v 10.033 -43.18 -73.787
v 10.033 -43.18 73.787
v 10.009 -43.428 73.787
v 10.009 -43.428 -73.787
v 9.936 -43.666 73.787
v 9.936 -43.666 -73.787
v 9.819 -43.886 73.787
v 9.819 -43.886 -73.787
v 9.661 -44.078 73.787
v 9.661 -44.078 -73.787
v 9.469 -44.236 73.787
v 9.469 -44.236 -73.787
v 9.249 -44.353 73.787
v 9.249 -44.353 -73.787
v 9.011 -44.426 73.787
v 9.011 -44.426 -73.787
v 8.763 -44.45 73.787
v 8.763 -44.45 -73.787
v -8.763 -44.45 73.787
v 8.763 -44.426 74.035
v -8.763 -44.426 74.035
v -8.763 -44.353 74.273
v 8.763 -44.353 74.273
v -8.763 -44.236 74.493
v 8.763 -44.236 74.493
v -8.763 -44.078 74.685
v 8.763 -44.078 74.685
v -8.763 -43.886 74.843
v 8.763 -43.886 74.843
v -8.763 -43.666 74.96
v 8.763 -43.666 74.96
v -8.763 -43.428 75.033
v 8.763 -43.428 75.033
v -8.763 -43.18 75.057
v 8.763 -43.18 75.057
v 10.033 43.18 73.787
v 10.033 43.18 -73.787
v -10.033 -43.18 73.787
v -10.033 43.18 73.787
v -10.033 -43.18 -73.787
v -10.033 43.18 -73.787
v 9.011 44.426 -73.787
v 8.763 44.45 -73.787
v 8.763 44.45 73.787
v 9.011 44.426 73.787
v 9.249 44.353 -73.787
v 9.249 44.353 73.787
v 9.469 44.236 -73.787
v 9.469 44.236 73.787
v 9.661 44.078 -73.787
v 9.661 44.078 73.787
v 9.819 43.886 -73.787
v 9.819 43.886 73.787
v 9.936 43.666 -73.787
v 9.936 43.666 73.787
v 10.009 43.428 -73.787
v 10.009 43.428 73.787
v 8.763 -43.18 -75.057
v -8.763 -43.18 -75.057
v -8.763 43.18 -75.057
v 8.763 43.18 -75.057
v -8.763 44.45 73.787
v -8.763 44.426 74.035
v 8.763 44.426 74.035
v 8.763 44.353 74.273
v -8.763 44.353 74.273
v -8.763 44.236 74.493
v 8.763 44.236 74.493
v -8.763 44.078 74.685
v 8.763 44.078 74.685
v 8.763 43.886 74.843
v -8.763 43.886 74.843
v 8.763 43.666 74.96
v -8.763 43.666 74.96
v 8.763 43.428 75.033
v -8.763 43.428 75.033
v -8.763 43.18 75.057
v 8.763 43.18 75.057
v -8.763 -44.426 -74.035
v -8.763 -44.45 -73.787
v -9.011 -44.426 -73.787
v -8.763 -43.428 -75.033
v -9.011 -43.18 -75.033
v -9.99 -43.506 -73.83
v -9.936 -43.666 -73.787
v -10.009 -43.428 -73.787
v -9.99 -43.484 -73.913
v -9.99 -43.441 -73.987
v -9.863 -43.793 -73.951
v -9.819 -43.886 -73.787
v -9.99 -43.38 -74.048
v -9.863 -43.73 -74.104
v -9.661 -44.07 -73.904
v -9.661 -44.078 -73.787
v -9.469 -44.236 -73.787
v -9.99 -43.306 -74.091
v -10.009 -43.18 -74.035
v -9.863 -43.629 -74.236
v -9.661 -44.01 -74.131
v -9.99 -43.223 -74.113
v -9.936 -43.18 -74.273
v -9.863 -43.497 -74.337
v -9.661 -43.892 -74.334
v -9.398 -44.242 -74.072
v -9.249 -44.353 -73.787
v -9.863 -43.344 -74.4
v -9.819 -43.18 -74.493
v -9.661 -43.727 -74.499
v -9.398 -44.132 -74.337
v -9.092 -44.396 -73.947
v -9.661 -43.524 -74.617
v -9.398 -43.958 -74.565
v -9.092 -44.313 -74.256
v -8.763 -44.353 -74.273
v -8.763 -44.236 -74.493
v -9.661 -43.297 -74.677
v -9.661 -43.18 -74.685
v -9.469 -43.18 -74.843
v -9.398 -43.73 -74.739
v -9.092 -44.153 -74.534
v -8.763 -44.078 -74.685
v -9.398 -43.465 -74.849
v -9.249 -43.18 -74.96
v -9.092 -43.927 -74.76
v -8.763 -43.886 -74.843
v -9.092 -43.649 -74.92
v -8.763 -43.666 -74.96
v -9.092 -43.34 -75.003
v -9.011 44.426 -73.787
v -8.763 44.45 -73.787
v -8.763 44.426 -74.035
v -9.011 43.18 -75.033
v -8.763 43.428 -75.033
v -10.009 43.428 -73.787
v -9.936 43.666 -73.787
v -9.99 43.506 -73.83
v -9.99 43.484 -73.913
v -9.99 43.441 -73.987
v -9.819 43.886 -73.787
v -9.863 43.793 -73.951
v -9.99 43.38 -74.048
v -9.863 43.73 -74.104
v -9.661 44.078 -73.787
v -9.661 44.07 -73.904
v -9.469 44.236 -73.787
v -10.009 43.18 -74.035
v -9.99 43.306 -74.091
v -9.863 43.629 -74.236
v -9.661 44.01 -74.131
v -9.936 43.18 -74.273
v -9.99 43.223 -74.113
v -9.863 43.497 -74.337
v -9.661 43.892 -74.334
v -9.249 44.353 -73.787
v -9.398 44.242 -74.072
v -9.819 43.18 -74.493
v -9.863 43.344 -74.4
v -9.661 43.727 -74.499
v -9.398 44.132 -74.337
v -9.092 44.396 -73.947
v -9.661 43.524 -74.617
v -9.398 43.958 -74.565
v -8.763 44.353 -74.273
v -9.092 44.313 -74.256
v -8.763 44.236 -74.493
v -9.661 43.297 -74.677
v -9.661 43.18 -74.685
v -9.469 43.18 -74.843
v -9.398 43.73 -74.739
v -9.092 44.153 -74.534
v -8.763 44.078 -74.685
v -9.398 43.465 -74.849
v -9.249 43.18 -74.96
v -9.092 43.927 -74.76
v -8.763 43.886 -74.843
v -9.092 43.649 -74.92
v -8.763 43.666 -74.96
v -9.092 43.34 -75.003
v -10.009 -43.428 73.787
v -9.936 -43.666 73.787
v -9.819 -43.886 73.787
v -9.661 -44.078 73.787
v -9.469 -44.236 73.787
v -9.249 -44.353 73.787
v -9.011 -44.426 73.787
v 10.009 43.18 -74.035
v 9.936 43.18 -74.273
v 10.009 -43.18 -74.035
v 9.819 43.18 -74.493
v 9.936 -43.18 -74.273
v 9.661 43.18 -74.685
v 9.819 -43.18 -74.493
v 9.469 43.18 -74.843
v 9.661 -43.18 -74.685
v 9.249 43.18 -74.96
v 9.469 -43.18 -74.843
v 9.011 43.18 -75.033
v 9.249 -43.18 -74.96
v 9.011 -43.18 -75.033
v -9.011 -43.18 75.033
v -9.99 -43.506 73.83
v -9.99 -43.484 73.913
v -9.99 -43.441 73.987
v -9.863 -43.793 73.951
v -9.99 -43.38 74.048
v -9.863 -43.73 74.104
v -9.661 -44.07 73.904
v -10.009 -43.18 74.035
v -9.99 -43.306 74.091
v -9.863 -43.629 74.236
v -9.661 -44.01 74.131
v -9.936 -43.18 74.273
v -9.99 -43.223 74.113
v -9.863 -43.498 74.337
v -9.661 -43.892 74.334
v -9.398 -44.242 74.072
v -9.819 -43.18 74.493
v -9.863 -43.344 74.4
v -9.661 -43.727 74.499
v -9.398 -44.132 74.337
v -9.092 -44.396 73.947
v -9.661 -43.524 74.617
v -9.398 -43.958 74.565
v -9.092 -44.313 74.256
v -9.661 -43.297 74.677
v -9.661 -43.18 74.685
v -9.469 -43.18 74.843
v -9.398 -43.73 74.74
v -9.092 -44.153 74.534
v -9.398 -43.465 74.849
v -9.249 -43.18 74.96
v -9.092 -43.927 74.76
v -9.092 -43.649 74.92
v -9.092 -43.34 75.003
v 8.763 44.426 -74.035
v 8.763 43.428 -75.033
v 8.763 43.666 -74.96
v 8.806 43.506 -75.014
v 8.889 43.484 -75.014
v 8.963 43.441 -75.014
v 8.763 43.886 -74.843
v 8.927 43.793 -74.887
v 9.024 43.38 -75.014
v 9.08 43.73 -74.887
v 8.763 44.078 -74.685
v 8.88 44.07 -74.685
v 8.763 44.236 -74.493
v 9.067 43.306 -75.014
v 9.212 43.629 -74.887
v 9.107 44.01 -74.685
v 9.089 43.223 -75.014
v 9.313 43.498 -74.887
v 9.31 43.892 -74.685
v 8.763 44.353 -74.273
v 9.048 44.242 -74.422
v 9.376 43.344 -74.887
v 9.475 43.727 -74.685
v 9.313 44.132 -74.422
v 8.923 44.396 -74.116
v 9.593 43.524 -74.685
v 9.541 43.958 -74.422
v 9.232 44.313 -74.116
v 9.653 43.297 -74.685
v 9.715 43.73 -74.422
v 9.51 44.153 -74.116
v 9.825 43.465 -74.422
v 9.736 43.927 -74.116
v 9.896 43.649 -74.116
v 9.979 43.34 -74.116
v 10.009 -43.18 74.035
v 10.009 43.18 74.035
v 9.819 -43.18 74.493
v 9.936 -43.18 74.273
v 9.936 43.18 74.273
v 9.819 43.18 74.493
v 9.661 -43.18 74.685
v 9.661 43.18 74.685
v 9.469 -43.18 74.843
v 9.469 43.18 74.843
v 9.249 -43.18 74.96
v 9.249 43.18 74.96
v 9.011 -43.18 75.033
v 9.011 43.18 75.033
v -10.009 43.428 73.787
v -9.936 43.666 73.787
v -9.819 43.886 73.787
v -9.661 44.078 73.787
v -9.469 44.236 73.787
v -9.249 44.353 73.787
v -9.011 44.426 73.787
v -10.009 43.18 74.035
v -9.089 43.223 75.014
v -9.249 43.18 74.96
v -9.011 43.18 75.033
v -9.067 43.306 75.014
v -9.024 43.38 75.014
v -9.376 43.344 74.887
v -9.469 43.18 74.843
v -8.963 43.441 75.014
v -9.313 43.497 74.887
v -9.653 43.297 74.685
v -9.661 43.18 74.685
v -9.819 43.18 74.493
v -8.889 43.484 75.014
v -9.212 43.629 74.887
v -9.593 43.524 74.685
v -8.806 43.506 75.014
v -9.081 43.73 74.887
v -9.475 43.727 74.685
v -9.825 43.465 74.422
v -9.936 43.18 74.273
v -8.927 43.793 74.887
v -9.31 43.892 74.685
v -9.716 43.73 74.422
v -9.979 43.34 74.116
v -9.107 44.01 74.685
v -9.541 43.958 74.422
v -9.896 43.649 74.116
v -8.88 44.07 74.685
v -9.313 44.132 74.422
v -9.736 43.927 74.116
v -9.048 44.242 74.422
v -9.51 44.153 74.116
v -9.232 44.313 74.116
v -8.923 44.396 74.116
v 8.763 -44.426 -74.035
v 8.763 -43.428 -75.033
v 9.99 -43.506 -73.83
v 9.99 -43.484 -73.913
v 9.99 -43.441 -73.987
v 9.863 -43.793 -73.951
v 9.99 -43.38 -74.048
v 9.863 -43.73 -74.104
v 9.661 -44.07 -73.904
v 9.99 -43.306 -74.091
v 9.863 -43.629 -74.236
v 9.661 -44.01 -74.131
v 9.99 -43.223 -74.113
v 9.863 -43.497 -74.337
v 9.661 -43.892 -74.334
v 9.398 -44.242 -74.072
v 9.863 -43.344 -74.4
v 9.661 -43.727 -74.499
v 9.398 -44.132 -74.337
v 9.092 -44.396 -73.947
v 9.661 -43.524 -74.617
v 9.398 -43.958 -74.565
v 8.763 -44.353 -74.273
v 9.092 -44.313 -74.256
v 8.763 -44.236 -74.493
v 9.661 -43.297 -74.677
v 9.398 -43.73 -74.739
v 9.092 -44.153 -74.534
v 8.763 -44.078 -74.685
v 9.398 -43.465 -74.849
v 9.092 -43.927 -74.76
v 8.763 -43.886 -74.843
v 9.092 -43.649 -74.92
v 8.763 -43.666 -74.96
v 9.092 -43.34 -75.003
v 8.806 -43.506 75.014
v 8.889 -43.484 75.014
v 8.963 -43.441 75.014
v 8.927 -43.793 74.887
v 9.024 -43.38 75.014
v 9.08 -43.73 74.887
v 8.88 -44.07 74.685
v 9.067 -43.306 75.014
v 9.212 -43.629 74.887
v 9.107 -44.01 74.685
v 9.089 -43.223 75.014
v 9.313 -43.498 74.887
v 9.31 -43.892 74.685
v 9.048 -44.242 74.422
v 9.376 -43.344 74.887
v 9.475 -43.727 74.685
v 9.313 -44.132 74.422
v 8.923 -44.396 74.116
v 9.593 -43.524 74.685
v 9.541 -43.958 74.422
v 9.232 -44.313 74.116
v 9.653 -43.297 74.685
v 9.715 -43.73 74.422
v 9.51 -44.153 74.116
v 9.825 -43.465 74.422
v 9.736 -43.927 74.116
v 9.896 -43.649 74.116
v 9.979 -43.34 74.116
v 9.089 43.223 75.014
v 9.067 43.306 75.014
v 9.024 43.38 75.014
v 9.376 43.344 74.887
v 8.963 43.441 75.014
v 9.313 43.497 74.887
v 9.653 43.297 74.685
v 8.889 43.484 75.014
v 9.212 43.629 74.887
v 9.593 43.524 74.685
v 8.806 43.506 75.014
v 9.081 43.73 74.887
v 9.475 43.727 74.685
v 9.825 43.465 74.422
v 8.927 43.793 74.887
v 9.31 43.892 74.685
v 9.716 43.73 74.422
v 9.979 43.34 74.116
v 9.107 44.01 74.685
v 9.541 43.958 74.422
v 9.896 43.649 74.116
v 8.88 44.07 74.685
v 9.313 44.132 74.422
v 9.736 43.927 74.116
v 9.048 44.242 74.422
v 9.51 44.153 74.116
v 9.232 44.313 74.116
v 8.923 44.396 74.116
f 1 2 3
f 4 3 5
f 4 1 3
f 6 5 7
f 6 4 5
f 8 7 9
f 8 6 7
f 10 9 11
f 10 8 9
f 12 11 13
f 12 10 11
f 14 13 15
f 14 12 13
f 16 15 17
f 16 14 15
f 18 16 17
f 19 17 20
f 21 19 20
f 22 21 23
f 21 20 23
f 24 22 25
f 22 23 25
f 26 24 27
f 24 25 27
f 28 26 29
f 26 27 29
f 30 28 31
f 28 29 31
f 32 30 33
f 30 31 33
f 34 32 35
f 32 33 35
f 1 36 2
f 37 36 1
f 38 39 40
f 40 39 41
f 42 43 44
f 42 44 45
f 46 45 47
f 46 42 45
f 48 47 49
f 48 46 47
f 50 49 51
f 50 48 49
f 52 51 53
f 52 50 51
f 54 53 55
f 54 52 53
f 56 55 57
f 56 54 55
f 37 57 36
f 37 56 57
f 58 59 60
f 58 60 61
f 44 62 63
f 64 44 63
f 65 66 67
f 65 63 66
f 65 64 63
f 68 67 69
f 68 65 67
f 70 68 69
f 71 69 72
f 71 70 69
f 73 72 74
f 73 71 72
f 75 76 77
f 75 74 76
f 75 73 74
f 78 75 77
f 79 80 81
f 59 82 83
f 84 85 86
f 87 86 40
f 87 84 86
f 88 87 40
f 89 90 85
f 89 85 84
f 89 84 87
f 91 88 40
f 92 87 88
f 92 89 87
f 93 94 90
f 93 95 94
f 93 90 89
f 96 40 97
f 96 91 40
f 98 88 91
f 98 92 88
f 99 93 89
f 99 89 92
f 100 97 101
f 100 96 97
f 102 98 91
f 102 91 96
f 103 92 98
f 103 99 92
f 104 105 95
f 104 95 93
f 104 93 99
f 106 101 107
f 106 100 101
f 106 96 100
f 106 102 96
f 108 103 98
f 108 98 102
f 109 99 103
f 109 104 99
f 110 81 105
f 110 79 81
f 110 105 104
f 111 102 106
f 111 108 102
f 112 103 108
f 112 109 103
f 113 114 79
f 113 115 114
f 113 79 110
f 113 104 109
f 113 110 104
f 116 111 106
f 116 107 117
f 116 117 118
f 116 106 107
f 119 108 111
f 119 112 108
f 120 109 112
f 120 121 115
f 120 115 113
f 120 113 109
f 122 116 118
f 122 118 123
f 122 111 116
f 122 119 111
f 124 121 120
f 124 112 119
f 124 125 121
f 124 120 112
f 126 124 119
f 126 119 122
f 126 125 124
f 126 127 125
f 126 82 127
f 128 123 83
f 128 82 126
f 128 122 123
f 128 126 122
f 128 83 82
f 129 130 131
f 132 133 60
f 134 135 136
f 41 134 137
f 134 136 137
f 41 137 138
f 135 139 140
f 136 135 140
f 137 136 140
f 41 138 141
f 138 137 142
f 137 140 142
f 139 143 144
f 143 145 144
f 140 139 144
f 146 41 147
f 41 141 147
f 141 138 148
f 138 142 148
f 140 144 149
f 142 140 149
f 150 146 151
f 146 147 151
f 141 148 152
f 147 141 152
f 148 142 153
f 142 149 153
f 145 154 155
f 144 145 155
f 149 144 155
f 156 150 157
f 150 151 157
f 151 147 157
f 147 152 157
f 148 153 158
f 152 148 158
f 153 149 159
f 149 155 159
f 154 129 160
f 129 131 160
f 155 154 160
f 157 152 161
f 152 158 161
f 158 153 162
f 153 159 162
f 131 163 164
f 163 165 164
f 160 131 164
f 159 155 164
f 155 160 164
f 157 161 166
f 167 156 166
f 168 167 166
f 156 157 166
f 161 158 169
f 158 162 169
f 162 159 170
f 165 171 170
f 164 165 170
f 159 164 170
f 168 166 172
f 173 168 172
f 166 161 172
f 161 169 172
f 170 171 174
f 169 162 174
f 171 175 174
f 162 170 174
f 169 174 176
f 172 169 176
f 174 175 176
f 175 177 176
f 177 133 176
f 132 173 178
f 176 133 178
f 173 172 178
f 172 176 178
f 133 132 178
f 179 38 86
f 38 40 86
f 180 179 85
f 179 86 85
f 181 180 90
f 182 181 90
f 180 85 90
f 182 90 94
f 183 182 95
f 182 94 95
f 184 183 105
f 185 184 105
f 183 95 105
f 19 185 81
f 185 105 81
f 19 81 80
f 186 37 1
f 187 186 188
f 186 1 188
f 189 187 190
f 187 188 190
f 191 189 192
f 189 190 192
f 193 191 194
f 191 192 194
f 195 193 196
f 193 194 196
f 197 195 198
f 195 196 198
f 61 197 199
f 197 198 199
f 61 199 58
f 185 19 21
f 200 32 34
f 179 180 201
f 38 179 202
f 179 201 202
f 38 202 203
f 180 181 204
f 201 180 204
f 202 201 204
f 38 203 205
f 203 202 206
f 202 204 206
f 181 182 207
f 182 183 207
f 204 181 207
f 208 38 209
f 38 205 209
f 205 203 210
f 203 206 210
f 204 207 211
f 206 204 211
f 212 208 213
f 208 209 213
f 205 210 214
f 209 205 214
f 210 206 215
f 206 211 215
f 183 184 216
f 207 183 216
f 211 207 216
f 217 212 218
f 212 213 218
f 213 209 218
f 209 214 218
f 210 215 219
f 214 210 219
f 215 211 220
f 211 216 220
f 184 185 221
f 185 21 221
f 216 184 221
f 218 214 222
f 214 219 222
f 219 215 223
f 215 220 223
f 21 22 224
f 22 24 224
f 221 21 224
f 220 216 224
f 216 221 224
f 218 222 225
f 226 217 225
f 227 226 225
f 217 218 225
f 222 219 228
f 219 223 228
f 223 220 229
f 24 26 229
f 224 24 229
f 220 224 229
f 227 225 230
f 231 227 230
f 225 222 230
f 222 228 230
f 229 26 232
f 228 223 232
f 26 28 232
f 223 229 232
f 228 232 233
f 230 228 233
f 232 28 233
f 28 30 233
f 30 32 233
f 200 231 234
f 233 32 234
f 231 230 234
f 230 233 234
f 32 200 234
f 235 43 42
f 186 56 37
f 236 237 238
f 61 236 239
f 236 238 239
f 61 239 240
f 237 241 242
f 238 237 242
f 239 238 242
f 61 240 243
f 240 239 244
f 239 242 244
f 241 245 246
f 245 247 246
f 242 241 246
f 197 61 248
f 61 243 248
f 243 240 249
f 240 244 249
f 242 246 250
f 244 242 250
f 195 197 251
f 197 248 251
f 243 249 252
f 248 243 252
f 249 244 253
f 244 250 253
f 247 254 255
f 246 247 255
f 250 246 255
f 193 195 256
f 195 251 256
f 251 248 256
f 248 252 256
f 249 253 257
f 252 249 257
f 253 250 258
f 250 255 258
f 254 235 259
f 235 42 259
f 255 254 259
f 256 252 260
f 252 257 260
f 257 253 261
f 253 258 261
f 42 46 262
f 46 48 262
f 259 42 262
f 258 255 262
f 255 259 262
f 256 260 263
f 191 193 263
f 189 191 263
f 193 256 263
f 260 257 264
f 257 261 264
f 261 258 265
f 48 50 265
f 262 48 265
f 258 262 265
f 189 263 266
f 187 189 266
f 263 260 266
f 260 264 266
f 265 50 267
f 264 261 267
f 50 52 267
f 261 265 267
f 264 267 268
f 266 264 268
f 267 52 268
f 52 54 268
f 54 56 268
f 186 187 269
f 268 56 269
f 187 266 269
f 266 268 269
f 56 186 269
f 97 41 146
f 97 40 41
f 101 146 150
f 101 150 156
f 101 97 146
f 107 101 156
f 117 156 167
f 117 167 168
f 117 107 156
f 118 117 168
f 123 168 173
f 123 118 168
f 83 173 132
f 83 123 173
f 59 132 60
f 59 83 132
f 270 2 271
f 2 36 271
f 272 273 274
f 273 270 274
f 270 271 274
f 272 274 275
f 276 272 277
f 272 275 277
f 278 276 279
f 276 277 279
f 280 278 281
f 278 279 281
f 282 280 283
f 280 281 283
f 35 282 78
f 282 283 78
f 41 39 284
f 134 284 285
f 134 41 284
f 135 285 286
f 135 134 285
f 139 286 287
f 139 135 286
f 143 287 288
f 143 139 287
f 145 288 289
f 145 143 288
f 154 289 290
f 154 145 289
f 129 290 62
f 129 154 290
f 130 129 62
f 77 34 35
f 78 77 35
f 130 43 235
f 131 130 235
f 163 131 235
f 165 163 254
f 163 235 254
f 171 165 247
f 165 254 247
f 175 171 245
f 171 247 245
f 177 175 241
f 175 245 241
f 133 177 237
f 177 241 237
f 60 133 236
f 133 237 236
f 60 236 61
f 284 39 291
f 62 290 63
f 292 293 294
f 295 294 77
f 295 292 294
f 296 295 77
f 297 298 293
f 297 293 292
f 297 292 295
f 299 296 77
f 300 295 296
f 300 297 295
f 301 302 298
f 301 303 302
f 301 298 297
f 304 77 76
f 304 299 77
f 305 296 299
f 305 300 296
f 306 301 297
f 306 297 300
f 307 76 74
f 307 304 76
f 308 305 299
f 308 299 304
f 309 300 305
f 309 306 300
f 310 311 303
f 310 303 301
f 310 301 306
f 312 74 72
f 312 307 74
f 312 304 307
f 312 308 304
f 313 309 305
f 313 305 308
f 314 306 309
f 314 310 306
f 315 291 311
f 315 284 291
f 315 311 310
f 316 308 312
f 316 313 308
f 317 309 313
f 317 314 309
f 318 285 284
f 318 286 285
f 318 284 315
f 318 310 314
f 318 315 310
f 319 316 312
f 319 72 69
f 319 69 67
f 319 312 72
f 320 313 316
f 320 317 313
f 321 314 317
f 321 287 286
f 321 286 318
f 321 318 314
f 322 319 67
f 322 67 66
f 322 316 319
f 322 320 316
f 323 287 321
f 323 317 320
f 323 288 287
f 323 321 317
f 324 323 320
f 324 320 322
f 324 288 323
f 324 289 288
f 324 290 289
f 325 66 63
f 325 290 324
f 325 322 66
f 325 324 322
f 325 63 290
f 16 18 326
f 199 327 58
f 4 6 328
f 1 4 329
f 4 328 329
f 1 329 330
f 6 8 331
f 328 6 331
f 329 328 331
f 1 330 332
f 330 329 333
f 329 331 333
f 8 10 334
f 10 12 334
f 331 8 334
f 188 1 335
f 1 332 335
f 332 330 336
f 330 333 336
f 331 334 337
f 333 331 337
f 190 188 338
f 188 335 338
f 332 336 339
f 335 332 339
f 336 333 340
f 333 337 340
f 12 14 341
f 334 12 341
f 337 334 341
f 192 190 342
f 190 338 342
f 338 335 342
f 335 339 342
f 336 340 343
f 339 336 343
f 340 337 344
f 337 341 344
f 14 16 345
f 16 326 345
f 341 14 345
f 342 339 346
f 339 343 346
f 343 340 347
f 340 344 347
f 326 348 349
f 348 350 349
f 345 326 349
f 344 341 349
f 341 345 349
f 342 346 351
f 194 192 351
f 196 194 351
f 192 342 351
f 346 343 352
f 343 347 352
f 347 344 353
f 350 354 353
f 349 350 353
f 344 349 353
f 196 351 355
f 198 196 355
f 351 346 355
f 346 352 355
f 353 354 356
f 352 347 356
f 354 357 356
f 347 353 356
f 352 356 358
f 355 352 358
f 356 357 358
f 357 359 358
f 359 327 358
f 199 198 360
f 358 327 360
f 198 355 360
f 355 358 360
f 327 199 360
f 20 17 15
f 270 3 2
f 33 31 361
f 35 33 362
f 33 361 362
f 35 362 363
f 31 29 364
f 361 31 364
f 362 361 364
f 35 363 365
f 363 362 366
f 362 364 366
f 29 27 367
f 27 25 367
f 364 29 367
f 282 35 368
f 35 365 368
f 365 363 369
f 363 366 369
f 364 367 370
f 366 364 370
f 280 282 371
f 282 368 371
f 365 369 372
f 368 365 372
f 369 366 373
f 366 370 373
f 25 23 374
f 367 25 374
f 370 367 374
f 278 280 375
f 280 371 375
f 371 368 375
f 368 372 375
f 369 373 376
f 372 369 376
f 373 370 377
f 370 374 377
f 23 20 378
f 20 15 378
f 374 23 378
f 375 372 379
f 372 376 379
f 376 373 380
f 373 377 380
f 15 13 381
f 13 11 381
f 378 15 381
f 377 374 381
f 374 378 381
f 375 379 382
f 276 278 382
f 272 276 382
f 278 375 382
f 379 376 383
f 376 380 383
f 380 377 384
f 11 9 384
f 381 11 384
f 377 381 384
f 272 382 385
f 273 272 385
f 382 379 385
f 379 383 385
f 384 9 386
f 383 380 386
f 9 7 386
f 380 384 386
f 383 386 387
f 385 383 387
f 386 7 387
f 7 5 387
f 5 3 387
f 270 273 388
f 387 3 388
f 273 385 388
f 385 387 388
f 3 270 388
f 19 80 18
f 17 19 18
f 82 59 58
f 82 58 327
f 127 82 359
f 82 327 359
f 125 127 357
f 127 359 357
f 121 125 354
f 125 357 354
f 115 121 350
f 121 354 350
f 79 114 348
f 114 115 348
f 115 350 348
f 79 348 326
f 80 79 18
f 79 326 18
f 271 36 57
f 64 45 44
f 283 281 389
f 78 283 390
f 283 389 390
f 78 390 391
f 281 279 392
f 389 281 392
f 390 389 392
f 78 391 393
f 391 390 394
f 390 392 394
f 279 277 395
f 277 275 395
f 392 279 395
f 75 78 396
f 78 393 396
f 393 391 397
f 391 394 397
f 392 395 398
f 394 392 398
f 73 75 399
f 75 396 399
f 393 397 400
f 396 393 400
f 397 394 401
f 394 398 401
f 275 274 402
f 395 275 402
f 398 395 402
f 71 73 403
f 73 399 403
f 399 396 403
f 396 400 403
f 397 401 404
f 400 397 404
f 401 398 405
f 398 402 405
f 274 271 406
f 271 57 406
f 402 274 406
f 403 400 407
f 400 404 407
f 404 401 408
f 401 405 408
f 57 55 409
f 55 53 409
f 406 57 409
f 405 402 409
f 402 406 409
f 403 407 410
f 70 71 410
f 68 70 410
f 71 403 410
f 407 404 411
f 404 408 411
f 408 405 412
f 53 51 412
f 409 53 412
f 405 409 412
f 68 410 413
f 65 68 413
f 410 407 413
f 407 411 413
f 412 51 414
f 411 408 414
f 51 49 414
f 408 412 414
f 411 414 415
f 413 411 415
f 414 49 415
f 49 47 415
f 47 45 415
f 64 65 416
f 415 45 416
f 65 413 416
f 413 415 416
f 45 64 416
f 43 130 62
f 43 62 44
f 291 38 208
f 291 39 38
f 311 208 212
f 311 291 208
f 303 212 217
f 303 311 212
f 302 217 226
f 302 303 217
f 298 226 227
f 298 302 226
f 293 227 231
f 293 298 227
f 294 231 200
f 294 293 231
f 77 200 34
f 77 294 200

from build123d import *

# Parameters (mm, degrees)
SKETCH1_W           = 20.066
SKETCH1_H           = 150.114
BOSS_EXTRUDE1_DEPTH = 44.45
FILLET1_R           = 1.27


with BuildPart() as part:
    # Sketch1 → Boss-Extrude1 (new body, symmetric)
    with BuildSketch(Plane(origin=(0, 0, 0), x_dir=(1, 0, 0), z_dir=(0, 1, 0))):
        Rectangle(SKETCH1_W, SKETCH1_H)
    extrude(amount=BOSS_EXTRUDE1_DEPTH, both=True)

    # Fillet1
    fillet1_edges = [part.edges().sort_by_distance(p)[0] for p in [
        (10.033, 44.45, 0),
        (0, 44.45, -75.057),
        (-10.033, 44.45, 0),
        (0, -44.45, -75.057),
        (10.033, -44.45, 0),
        (0, -44.45, 75.057),
        (-10.033, -44.45, 0),
        (-10.033, 0, -75.057),
        (10.033, 0, -75.057),
        (10.033, 0, 75.057),
        (-10.033, 0, 75.057),
        (0, 44.45, 75.057),
    ]]
    fillet(fillet1_edges, radius=FILLET1_R)


solid = part.part
